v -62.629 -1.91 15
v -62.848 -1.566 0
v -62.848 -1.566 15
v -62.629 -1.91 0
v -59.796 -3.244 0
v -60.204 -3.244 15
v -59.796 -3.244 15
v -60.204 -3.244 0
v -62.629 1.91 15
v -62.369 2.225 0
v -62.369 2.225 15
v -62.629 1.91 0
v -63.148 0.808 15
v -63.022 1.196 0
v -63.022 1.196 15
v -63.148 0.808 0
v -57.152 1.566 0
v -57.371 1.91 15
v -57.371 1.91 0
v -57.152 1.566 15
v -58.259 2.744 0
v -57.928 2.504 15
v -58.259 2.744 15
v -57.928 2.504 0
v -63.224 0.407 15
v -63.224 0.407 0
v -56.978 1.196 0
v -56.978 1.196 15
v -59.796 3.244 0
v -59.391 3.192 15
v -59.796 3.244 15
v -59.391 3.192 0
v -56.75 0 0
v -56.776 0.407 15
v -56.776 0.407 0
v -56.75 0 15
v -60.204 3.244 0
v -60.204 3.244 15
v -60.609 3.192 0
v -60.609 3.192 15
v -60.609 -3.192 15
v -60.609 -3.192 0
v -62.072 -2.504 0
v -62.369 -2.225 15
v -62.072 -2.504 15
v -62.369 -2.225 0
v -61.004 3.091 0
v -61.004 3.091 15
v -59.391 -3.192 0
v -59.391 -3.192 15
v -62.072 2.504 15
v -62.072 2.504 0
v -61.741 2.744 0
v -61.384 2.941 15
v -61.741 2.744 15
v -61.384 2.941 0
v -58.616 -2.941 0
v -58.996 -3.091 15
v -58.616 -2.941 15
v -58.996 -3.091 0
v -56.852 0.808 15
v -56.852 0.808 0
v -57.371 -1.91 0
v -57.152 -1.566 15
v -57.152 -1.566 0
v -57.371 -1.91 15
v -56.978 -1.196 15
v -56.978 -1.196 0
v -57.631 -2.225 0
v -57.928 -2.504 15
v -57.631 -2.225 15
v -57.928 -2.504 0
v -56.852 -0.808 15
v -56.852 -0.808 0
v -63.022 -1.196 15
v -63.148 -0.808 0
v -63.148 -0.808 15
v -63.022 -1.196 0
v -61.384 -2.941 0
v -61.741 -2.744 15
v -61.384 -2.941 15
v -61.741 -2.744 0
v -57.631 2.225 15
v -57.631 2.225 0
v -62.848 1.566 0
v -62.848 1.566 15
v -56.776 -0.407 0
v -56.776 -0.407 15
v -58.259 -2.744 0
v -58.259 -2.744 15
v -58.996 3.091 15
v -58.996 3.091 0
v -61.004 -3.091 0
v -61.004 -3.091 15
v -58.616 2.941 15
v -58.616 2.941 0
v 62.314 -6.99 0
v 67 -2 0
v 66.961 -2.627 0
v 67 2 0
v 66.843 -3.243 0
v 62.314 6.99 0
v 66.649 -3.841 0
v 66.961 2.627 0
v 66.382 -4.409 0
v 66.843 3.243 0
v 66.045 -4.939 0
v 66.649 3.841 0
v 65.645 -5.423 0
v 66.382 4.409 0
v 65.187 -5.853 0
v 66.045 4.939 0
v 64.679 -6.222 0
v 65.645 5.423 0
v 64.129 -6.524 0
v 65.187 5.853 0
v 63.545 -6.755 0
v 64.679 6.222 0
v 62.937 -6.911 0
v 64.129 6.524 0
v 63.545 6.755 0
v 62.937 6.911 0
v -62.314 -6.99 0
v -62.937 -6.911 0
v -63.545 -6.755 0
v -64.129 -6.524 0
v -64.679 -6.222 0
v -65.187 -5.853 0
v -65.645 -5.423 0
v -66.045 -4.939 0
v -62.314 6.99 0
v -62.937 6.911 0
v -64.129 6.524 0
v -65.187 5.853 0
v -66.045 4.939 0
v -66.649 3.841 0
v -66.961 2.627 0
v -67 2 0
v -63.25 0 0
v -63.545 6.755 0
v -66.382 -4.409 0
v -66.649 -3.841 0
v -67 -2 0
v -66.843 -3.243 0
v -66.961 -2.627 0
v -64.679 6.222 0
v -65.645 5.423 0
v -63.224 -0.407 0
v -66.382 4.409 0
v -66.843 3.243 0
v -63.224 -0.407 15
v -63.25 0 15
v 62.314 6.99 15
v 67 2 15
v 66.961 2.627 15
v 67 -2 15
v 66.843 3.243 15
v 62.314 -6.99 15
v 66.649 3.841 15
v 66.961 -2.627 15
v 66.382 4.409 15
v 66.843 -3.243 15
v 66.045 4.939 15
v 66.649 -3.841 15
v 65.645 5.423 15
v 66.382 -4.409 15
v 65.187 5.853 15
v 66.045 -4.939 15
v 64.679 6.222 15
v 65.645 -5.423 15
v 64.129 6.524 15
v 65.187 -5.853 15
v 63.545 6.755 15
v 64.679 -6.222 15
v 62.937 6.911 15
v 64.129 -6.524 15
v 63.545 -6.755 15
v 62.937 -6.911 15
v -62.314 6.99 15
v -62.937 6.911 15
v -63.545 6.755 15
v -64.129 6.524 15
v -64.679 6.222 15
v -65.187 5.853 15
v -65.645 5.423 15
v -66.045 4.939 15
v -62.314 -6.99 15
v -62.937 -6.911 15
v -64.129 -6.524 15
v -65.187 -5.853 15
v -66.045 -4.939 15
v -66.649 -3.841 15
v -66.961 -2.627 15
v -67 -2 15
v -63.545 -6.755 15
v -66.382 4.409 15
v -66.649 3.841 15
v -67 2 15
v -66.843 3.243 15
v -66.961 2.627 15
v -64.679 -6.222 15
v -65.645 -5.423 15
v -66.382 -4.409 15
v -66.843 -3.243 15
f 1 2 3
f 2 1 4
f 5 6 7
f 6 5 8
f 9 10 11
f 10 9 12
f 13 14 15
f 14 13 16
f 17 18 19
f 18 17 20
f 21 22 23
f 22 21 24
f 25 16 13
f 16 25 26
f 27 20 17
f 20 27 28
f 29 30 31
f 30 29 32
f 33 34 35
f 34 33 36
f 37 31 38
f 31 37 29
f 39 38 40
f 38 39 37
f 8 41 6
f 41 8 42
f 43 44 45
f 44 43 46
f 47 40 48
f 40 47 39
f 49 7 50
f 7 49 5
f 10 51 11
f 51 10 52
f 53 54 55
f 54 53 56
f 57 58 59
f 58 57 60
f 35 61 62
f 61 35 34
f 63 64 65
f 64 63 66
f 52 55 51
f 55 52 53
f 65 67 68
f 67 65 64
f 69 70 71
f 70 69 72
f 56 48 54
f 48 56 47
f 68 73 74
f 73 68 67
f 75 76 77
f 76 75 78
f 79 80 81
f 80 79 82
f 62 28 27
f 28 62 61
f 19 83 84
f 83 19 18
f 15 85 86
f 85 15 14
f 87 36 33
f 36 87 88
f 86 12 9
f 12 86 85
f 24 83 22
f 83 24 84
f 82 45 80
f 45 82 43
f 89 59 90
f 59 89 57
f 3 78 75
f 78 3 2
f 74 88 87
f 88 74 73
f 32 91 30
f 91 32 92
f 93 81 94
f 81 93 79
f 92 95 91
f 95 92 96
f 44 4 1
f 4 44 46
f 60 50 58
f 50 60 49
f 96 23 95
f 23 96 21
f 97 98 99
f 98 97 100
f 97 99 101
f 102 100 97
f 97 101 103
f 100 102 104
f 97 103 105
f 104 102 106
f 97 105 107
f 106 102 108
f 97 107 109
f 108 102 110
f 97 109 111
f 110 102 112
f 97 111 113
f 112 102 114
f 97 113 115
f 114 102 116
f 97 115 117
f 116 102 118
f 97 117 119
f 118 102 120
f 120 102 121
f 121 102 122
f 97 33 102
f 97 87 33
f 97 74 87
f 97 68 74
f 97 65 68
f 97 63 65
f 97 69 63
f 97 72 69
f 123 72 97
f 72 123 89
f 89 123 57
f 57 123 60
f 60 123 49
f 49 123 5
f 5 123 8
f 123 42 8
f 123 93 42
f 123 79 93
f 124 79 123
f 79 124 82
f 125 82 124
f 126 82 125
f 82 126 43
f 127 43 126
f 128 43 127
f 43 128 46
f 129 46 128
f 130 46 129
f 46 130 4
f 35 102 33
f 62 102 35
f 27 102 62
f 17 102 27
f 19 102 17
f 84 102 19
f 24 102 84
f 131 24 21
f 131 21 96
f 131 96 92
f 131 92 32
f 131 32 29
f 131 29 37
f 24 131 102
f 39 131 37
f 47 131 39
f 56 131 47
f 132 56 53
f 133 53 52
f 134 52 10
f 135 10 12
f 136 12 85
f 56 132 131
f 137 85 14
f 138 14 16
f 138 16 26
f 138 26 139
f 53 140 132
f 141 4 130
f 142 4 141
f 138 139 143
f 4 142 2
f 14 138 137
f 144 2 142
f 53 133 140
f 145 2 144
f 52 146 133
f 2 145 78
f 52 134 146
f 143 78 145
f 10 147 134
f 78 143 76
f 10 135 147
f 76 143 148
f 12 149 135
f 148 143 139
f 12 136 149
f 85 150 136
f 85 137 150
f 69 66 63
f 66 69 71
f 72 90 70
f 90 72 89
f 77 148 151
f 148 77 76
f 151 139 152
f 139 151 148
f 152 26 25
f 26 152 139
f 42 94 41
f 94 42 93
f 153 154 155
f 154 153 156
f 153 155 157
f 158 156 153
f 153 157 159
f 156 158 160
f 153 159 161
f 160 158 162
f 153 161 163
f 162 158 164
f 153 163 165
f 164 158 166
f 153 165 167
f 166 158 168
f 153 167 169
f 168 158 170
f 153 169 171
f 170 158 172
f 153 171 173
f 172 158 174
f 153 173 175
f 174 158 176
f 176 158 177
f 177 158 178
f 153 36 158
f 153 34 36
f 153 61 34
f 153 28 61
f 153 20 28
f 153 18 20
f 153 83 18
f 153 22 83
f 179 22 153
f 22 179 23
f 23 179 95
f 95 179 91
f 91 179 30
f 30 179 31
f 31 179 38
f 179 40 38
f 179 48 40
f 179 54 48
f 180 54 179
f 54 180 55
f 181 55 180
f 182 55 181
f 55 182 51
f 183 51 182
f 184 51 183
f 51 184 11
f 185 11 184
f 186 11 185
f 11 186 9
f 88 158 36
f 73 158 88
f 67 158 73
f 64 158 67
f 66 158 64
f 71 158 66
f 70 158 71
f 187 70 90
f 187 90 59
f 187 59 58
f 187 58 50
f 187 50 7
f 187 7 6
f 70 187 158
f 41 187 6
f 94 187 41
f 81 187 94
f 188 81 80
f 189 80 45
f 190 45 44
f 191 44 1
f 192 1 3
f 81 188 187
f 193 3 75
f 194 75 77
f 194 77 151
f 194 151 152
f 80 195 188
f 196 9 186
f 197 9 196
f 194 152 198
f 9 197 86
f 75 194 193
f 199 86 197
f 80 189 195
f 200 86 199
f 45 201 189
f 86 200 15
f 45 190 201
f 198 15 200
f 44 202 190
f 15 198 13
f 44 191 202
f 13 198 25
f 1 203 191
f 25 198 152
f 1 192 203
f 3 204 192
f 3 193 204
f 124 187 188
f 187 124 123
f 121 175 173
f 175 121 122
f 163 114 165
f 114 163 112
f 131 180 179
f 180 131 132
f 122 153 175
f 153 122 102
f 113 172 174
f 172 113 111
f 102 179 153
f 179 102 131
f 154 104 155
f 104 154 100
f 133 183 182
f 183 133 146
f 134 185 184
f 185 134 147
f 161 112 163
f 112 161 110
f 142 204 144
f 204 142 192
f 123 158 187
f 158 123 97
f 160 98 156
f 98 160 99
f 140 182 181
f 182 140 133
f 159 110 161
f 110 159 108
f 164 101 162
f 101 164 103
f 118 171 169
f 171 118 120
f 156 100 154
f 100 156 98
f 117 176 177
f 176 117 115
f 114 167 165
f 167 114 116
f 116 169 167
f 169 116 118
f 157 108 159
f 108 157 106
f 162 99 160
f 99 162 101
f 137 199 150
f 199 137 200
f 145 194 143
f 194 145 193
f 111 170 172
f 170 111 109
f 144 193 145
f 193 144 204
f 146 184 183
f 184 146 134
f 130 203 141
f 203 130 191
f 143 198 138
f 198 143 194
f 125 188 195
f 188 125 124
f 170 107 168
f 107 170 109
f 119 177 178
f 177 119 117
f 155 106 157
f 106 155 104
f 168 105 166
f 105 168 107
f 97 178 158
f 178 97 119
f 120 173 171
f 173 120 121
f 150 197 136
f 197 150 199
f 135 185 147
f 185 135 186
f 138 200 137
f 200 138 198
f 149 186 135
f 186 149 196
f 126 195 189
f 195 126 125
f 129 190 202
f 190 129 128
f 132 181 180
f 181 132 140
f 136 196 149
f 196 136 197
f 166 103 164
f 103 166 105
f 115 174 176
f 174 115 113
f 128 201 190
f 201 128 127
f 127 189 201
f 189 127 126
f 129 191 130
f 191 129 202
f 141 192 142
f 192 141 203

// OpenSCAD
$fn = 50;


difference() {
	union() {
		hull() {
			translate(v = [-62.0000000000, 2.0000000000, 0]) {
				cylinder(h = 15, r = 5);
			}
			translate(v = [62.0000000000, 2.0000000000, 0]) {
				cylinder(h = 15, r = 5);
			}
			translate(v = [-62.0000000000, -2.0000000000, 0]) {
				cylinder(h = 15, r = 5);
			}
			translate(v = [62.0000000000, -2.0000000000, 0]) {
				cylinder(h = 15, r = 5);
			}
		}
	}
	union() {
		translate(v = [-60.0000000000, 0.0000000000, 0]) {
			cylinder(h = 15, r = 3.2500000000);
		}
		translate(v = [-60.0000000000, 0.0000000000, 0]) {
			cylinder(h = 15, r = 1.8000000000);
		}
		translate(v = [-60.0000000000, 0.0000000000, 0]) {
			cylinder(h = 15, r = 1.8000000000);
		}
		translate(v = [-60.0000000000, 0.0000000000, 0]) {
			cylinder(h = 15, r = 1.8000000000);
		}
	}
}
